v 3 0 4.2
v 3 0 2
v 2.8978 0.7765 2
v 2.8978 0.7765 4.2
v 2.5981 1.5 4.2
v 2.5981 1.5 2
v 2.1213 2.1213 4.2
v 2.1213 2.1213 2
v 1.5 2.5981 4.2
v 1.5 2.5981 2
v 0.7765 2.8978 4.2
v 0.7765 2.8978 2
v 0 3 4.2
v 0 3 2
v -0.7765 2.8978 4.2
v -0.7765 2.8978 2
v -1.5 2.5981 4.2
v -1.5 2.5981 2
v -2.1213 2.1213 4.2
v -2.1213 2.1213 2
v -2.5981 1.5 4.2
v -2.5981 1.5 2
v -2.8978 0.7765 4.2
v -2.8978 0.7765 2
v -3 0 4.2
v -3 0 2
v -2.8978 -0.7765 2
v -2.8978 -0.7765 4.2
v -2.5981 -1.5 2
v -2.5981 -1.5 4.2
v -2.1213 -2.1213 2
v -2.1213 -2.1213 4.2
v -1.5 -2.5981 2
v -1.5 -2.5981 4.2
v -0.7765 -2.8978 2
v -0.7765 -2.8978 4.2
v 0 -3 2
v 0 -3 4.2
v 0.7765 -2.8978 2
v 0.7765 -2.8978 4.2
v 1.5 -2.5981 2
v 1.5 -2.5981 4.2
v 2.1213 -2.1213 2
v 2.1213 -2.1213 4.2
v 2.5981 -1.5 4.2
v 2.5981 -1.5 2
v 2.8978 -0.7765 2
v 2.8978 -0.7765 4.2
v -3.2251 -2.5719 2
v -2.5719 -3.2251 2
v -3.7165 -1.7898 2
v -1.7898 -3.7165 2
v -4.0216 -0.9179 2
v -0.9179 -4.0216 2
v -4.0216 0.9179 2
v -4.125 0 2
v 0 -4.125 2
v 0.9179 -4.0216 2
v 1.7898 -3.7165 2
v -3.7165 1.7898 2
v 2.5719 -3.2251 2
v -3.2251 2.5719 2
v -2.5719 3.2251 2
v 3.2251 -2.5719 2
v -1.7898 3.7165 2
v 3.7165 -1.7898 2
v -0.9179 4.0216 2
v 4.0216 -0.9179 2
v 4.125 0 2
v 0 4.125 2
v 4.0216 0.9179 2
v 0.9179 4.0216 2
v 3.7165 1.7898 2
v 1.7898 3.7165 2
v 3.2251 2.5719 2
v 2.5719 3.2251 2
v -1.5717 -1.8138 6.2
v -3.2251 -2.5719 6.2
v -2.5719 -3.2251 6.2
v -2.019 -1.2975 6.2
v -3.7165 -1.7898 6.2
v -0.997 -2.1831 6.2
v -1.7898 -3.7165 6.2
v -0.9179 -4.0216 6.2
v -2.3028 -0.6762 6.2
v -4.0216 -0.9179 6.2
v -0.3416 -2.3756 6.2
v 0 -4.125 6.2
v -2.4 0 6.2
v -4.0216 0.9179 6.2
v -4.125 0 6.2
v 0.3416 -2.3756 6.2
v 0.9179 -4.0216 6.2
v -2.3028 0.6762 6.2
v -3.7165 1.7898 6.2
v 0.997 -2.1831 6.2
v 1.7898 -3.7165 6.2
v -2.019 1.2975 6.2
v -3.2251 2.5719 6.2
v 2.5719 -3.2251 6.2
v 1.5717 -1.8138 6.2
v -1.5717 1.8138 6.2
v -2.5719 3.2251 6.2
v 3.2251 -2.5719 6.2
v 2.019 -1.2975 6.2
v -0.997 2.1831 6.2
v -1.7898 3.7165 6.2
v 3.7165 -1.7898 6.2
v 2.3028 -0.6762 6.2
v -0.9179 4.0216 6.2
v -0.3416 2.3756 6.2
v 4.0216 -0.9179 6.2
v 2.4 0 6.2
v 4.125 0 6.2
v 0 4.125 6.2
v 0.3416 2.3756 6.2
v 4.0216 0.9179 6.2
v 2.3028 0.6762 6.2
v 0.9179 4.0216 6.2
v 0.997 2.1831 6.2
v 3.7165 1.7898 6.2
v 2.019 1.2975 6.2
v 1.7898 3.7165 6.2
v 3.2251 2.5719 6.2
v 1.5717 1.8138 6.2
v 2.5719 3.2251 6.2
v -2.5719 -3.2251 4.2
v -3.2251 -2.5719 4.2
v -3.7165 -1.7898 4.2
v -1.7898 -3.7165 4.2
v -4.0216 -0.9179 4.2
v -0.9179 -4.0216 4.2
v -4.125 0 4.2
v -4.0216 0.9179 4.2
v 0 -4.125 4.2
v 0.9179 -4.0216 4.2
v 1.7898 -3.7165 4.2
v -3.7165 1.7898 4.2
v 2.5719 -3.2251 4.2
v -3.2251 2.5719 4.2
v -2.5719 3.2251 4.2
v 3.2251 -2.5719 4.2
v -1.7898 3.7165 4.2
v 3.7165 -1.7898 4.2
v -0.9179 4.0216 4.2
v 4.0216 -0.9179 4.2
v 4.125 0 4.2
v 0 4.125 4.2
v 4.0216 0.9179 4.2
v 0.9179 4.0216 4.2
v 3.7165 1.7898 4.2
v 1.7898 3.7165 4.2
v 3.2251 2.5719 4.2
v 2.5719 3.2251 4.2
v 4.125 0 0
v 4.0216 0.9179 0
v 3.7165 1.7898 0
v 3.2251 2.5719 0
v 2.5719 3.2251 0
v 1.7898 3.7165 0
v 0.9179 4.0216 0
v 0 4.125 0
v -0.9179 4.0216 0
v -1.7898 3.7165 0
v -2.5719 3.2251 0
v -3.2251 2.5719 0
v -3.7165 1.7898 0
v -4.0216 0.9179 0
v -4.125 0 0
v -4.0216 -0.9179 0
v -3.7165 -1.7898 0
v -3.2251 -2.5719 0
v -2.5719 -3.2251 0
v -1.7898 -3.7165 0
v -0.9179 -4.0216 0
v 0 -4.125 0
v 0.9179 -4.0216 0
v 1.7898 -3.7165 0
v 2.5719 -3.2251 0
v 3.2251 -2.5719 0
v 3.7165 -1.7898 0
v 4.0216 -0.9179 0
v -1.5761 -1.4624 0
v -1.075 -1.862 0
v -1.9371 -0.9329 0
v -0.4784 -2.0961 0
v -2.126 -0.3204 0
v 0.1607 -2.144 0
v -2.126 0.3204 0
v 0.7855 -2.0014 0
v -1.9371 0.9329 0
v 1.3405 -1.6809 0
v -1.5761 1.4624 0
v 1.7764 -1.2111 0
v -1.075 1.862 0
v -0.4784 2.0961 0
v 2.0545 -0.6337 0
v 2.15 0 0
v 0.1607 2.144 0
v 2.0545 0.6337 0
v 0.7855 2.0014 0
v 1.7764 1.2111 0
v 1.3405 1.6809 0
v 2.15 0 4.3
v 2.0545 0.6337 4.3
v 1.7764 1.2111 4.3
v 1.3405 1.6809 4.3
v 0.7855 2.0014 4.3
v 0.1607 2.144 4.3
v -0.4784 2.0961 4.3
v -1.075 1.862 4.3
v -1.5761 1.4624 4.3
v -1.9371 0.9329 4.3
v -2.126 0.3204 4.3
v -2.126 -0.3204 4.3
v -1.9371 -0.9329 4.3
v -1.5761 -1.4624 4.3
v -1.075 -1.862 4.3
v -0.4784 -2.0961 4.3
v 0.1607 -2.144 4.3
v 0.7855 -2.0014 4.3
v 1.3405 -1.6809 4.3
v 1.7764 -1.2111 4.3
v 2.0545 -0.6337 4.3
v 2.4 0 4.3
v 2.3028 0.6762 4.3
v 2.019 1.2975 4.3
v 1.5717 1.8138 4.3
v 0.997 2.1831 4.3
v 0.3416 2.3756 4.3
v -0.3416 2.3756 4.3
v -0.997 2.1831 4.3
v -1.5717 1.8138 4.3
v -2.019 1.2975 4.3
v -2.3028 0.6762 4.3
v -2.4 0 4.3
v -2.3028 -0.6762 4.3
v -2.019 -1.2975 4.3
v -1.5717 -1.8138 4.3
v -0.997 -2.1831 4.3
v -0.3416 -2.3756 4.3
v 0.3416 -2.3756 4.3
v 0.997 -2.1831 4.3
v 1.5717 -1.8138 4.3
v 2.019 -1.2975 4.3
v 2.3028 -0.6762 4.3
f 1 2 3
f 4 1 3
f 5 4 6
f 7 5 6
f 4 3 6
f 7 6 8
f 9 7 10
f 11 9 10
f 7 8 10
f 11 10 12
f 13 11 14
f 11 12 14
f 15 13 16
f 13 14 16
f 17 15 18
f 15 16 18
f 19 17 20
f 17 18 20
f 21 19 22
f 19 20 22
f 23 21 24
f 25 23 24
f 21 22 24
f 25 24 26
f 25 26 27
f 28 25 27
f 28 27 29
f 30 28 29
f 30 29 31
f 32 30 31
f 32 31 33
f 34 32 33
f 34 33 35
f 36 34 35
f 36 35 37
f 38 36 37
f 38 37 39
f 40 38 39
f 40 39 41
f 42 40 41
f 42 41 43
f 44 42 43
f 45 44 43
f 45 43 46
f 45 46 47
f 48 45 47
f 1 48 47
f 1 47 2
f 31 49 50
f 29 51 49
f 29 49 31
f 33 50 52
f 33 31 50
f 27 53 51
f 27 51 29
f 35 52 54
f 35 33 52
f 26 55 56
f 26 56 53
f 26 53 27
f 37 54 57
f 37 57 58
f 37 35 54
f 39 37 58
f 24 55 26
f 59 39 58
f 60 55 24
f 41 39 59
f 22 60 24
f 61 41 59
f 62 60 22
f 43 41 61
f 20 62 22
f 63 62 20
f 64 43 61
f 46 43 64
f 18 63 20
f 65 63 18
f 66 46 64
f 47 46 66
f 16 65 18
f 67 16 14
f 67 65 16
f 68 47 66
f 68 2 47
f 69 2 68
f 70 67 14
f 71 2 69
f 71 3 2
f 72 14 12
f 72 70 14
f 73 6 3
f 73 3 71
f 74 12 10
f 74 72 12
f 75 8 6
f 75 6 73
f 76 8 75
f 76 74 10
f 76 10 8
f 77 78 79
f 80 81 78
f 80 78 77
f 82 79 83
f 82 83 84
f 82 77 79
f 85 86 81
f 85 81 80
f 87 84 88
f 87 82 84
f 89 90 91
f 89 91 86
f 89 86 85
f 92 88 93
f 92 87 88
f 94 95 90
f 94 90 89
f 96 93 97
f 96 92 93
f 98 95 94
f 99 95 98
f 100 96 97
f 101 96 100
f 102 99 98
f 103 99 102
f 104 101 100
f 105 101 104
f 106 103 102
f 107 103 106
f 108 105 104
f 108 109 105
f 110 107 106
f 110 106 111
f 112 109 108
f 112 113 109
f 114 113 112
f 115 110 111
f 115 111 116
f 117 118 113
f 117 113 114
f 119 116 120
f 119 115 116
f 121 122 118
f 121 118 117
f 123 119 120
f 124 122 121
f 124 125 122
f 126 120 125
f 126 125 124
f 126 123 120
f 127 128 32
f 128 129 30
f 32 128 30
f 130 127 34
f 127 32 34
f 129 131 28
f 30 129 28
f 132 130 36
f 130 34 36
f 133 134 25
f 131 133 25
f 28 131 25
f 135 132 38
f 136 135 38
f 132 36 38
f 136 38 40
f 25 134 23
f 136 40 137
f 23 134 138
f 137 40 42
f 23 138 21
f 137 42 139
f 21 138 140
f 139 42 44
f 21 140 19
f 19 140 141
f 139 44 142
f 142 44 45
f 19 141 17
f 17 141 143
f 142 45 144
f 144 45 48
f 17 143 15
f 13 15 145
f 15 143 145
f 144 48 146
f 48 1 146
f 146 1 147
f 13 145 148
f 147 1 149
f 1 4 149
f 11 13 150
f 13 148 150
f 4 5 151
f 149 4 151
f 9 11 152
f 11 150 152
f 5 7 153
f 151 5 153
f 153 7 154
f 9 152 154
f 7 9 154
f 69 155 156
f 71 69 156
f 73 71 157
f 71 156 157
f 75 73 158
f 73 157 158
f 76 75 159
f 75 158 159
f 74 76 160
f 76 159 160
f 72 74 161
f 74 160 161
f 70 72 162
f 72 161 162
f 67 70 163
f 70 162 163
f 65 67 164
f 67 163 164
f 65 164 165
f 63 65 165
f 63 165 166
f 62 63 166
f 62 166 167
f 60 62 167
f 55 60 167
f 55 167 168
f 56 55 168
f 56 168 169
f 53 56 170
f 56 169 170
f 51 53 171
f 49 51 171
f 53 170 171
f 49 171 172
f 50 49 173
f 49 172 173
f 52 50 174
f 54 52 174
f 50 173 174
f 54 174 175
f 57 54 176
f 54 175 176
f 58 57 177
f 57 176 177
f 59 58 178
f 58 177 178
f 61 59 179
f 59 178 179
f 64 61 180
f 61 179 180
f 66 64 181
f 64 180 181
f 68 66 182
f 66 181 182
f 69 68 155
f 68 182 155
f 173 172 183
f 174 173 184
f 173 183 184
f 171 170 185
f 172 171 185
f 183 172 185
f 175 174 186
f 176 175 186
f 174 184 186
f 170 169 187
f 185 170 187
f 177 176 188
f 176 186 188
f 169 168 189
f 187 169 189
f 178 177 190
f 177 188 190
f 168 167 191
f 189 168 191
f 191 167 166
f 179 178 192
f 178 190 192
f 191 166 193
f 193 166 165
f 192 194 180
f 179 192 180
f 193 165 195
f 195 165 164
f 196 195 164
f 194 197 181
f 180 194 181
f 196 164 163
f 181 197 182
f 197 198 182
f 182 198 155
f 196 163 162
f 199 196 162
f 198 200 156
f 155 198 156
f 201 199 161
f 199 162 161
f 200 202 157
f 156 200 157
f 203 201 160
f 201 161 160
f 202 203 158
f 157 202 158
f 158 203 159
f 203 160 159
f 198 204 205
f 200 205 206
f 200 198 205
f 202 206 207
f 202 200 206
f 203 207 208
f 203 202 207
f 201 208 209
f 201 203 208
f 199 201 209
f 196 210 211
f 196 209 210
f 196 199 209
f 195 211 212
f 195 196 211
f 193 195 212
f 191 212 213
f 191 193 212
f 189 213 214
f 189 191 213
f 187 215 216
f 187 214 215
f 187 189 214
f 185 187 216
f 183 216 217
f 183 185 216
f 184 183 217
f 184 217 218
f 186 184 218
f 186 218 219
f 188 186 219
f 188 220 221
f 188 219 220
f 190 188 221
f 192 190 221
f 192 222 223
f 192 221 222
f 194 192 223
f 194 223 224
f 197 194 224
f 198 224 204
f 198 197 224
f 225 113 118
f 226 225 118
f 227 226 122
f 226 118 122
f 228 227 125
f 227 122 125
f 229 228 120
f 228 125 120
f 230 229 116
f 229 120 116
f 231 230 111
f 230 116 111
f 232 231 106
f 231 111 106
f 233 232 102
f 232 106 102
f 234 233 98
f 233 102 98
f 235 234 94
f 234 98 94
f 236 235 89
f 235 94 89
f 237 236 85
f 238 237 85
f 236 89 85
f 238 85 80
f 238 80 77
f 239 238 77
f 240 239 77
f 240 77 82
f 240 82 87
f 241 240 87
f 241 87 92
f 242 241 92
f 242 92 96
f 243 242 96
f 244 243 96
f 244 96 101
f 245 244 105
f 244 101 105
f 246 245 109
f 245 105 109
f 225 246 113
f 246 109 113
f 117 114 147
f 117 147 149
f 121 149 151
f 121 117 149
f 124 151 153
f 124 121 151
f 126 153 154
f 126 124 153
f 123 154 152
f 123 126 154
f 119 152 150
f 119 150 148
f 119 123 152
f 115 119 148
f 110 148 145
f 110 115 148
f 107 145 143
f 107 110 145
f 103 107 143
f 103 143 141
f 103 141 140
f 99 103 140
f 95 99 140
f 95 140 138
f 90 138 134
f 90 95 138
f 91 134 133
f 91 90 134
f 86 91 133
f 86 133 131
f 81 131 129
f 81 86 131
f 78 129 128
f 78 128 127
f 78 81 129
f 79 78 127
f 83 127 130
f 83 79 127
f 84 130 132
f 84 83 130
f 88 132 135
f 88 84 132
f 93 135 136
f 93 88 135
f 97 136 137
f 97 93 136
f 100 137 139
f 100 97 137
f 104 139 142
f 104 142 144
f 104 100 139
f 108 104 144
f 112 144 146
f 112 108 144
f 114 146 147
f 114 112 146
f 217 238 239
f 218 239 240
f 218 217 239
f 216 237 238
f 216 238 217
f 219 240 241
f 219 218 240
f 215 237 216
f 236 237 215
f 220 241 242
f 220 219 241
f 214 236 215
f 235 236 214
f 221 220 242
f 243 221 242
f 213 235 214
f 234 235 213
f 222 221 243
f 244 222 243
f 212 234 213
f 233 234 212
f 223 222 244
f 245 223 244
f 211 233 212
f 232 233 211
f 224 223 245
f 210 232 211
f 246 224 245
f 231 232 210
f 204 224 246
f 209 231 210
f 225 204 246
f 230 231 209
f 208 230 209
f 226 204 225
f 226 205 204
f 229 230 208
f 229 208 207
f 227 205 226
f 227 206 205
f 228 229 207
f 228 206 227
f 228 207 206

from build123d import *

# Parameters (mm, degrees)
F0_R     = 4.125
F0_R_2   = 3
F1_DEPTH = 2
F0_R_3   = 2.15
F2_DEPTH = 6.2
F3_R     = 4.125
F3_R_2   = 3
F4_DEPTH = 2
F3_R_3   = 2.4
F3_R_4   = 2.15
F5_DEPTH = 1.9


with BuildPart() as f1:
    # F0 (on Top) → F1 (new body)
    with BuildSketch(Plane.XY):
        Circle(F0_R)
        Circle(F0_R_2, mode=Mode.SUBTRACT)
    extrude(amount=F1_DEPTH)

    # F0 (on Top) → F2 (join)
    with BuildSketch(Plane.XY):
        Circle(F0_R_2)
        Circle(F0_R_3, mode=Mode.SUBTRACT)
    extrude(amount=F2_DEPTH)

    # F3 (on face) → F4 (join)
    with BuildSketch(Plane.XY.offset(6.2)):
        Circle(F3_R)
        Circle(F3_R_2, mode=Mode.SUBTRACT)
    extrude(amount=-F4_DEPTH)

    # F3 (on face) → F5 (cut)
    with BuildSketch(Plane.XY.offset(6.2)):
        Circle(F3_R_3)
        Circle(F3_R_4, mode=Mode.SUBTRACT)
        Circle(F3_R_4)
    extrude(amount=-F5_DEPTH, mode=Mode.SUBTRACT)


solid = f1.part
